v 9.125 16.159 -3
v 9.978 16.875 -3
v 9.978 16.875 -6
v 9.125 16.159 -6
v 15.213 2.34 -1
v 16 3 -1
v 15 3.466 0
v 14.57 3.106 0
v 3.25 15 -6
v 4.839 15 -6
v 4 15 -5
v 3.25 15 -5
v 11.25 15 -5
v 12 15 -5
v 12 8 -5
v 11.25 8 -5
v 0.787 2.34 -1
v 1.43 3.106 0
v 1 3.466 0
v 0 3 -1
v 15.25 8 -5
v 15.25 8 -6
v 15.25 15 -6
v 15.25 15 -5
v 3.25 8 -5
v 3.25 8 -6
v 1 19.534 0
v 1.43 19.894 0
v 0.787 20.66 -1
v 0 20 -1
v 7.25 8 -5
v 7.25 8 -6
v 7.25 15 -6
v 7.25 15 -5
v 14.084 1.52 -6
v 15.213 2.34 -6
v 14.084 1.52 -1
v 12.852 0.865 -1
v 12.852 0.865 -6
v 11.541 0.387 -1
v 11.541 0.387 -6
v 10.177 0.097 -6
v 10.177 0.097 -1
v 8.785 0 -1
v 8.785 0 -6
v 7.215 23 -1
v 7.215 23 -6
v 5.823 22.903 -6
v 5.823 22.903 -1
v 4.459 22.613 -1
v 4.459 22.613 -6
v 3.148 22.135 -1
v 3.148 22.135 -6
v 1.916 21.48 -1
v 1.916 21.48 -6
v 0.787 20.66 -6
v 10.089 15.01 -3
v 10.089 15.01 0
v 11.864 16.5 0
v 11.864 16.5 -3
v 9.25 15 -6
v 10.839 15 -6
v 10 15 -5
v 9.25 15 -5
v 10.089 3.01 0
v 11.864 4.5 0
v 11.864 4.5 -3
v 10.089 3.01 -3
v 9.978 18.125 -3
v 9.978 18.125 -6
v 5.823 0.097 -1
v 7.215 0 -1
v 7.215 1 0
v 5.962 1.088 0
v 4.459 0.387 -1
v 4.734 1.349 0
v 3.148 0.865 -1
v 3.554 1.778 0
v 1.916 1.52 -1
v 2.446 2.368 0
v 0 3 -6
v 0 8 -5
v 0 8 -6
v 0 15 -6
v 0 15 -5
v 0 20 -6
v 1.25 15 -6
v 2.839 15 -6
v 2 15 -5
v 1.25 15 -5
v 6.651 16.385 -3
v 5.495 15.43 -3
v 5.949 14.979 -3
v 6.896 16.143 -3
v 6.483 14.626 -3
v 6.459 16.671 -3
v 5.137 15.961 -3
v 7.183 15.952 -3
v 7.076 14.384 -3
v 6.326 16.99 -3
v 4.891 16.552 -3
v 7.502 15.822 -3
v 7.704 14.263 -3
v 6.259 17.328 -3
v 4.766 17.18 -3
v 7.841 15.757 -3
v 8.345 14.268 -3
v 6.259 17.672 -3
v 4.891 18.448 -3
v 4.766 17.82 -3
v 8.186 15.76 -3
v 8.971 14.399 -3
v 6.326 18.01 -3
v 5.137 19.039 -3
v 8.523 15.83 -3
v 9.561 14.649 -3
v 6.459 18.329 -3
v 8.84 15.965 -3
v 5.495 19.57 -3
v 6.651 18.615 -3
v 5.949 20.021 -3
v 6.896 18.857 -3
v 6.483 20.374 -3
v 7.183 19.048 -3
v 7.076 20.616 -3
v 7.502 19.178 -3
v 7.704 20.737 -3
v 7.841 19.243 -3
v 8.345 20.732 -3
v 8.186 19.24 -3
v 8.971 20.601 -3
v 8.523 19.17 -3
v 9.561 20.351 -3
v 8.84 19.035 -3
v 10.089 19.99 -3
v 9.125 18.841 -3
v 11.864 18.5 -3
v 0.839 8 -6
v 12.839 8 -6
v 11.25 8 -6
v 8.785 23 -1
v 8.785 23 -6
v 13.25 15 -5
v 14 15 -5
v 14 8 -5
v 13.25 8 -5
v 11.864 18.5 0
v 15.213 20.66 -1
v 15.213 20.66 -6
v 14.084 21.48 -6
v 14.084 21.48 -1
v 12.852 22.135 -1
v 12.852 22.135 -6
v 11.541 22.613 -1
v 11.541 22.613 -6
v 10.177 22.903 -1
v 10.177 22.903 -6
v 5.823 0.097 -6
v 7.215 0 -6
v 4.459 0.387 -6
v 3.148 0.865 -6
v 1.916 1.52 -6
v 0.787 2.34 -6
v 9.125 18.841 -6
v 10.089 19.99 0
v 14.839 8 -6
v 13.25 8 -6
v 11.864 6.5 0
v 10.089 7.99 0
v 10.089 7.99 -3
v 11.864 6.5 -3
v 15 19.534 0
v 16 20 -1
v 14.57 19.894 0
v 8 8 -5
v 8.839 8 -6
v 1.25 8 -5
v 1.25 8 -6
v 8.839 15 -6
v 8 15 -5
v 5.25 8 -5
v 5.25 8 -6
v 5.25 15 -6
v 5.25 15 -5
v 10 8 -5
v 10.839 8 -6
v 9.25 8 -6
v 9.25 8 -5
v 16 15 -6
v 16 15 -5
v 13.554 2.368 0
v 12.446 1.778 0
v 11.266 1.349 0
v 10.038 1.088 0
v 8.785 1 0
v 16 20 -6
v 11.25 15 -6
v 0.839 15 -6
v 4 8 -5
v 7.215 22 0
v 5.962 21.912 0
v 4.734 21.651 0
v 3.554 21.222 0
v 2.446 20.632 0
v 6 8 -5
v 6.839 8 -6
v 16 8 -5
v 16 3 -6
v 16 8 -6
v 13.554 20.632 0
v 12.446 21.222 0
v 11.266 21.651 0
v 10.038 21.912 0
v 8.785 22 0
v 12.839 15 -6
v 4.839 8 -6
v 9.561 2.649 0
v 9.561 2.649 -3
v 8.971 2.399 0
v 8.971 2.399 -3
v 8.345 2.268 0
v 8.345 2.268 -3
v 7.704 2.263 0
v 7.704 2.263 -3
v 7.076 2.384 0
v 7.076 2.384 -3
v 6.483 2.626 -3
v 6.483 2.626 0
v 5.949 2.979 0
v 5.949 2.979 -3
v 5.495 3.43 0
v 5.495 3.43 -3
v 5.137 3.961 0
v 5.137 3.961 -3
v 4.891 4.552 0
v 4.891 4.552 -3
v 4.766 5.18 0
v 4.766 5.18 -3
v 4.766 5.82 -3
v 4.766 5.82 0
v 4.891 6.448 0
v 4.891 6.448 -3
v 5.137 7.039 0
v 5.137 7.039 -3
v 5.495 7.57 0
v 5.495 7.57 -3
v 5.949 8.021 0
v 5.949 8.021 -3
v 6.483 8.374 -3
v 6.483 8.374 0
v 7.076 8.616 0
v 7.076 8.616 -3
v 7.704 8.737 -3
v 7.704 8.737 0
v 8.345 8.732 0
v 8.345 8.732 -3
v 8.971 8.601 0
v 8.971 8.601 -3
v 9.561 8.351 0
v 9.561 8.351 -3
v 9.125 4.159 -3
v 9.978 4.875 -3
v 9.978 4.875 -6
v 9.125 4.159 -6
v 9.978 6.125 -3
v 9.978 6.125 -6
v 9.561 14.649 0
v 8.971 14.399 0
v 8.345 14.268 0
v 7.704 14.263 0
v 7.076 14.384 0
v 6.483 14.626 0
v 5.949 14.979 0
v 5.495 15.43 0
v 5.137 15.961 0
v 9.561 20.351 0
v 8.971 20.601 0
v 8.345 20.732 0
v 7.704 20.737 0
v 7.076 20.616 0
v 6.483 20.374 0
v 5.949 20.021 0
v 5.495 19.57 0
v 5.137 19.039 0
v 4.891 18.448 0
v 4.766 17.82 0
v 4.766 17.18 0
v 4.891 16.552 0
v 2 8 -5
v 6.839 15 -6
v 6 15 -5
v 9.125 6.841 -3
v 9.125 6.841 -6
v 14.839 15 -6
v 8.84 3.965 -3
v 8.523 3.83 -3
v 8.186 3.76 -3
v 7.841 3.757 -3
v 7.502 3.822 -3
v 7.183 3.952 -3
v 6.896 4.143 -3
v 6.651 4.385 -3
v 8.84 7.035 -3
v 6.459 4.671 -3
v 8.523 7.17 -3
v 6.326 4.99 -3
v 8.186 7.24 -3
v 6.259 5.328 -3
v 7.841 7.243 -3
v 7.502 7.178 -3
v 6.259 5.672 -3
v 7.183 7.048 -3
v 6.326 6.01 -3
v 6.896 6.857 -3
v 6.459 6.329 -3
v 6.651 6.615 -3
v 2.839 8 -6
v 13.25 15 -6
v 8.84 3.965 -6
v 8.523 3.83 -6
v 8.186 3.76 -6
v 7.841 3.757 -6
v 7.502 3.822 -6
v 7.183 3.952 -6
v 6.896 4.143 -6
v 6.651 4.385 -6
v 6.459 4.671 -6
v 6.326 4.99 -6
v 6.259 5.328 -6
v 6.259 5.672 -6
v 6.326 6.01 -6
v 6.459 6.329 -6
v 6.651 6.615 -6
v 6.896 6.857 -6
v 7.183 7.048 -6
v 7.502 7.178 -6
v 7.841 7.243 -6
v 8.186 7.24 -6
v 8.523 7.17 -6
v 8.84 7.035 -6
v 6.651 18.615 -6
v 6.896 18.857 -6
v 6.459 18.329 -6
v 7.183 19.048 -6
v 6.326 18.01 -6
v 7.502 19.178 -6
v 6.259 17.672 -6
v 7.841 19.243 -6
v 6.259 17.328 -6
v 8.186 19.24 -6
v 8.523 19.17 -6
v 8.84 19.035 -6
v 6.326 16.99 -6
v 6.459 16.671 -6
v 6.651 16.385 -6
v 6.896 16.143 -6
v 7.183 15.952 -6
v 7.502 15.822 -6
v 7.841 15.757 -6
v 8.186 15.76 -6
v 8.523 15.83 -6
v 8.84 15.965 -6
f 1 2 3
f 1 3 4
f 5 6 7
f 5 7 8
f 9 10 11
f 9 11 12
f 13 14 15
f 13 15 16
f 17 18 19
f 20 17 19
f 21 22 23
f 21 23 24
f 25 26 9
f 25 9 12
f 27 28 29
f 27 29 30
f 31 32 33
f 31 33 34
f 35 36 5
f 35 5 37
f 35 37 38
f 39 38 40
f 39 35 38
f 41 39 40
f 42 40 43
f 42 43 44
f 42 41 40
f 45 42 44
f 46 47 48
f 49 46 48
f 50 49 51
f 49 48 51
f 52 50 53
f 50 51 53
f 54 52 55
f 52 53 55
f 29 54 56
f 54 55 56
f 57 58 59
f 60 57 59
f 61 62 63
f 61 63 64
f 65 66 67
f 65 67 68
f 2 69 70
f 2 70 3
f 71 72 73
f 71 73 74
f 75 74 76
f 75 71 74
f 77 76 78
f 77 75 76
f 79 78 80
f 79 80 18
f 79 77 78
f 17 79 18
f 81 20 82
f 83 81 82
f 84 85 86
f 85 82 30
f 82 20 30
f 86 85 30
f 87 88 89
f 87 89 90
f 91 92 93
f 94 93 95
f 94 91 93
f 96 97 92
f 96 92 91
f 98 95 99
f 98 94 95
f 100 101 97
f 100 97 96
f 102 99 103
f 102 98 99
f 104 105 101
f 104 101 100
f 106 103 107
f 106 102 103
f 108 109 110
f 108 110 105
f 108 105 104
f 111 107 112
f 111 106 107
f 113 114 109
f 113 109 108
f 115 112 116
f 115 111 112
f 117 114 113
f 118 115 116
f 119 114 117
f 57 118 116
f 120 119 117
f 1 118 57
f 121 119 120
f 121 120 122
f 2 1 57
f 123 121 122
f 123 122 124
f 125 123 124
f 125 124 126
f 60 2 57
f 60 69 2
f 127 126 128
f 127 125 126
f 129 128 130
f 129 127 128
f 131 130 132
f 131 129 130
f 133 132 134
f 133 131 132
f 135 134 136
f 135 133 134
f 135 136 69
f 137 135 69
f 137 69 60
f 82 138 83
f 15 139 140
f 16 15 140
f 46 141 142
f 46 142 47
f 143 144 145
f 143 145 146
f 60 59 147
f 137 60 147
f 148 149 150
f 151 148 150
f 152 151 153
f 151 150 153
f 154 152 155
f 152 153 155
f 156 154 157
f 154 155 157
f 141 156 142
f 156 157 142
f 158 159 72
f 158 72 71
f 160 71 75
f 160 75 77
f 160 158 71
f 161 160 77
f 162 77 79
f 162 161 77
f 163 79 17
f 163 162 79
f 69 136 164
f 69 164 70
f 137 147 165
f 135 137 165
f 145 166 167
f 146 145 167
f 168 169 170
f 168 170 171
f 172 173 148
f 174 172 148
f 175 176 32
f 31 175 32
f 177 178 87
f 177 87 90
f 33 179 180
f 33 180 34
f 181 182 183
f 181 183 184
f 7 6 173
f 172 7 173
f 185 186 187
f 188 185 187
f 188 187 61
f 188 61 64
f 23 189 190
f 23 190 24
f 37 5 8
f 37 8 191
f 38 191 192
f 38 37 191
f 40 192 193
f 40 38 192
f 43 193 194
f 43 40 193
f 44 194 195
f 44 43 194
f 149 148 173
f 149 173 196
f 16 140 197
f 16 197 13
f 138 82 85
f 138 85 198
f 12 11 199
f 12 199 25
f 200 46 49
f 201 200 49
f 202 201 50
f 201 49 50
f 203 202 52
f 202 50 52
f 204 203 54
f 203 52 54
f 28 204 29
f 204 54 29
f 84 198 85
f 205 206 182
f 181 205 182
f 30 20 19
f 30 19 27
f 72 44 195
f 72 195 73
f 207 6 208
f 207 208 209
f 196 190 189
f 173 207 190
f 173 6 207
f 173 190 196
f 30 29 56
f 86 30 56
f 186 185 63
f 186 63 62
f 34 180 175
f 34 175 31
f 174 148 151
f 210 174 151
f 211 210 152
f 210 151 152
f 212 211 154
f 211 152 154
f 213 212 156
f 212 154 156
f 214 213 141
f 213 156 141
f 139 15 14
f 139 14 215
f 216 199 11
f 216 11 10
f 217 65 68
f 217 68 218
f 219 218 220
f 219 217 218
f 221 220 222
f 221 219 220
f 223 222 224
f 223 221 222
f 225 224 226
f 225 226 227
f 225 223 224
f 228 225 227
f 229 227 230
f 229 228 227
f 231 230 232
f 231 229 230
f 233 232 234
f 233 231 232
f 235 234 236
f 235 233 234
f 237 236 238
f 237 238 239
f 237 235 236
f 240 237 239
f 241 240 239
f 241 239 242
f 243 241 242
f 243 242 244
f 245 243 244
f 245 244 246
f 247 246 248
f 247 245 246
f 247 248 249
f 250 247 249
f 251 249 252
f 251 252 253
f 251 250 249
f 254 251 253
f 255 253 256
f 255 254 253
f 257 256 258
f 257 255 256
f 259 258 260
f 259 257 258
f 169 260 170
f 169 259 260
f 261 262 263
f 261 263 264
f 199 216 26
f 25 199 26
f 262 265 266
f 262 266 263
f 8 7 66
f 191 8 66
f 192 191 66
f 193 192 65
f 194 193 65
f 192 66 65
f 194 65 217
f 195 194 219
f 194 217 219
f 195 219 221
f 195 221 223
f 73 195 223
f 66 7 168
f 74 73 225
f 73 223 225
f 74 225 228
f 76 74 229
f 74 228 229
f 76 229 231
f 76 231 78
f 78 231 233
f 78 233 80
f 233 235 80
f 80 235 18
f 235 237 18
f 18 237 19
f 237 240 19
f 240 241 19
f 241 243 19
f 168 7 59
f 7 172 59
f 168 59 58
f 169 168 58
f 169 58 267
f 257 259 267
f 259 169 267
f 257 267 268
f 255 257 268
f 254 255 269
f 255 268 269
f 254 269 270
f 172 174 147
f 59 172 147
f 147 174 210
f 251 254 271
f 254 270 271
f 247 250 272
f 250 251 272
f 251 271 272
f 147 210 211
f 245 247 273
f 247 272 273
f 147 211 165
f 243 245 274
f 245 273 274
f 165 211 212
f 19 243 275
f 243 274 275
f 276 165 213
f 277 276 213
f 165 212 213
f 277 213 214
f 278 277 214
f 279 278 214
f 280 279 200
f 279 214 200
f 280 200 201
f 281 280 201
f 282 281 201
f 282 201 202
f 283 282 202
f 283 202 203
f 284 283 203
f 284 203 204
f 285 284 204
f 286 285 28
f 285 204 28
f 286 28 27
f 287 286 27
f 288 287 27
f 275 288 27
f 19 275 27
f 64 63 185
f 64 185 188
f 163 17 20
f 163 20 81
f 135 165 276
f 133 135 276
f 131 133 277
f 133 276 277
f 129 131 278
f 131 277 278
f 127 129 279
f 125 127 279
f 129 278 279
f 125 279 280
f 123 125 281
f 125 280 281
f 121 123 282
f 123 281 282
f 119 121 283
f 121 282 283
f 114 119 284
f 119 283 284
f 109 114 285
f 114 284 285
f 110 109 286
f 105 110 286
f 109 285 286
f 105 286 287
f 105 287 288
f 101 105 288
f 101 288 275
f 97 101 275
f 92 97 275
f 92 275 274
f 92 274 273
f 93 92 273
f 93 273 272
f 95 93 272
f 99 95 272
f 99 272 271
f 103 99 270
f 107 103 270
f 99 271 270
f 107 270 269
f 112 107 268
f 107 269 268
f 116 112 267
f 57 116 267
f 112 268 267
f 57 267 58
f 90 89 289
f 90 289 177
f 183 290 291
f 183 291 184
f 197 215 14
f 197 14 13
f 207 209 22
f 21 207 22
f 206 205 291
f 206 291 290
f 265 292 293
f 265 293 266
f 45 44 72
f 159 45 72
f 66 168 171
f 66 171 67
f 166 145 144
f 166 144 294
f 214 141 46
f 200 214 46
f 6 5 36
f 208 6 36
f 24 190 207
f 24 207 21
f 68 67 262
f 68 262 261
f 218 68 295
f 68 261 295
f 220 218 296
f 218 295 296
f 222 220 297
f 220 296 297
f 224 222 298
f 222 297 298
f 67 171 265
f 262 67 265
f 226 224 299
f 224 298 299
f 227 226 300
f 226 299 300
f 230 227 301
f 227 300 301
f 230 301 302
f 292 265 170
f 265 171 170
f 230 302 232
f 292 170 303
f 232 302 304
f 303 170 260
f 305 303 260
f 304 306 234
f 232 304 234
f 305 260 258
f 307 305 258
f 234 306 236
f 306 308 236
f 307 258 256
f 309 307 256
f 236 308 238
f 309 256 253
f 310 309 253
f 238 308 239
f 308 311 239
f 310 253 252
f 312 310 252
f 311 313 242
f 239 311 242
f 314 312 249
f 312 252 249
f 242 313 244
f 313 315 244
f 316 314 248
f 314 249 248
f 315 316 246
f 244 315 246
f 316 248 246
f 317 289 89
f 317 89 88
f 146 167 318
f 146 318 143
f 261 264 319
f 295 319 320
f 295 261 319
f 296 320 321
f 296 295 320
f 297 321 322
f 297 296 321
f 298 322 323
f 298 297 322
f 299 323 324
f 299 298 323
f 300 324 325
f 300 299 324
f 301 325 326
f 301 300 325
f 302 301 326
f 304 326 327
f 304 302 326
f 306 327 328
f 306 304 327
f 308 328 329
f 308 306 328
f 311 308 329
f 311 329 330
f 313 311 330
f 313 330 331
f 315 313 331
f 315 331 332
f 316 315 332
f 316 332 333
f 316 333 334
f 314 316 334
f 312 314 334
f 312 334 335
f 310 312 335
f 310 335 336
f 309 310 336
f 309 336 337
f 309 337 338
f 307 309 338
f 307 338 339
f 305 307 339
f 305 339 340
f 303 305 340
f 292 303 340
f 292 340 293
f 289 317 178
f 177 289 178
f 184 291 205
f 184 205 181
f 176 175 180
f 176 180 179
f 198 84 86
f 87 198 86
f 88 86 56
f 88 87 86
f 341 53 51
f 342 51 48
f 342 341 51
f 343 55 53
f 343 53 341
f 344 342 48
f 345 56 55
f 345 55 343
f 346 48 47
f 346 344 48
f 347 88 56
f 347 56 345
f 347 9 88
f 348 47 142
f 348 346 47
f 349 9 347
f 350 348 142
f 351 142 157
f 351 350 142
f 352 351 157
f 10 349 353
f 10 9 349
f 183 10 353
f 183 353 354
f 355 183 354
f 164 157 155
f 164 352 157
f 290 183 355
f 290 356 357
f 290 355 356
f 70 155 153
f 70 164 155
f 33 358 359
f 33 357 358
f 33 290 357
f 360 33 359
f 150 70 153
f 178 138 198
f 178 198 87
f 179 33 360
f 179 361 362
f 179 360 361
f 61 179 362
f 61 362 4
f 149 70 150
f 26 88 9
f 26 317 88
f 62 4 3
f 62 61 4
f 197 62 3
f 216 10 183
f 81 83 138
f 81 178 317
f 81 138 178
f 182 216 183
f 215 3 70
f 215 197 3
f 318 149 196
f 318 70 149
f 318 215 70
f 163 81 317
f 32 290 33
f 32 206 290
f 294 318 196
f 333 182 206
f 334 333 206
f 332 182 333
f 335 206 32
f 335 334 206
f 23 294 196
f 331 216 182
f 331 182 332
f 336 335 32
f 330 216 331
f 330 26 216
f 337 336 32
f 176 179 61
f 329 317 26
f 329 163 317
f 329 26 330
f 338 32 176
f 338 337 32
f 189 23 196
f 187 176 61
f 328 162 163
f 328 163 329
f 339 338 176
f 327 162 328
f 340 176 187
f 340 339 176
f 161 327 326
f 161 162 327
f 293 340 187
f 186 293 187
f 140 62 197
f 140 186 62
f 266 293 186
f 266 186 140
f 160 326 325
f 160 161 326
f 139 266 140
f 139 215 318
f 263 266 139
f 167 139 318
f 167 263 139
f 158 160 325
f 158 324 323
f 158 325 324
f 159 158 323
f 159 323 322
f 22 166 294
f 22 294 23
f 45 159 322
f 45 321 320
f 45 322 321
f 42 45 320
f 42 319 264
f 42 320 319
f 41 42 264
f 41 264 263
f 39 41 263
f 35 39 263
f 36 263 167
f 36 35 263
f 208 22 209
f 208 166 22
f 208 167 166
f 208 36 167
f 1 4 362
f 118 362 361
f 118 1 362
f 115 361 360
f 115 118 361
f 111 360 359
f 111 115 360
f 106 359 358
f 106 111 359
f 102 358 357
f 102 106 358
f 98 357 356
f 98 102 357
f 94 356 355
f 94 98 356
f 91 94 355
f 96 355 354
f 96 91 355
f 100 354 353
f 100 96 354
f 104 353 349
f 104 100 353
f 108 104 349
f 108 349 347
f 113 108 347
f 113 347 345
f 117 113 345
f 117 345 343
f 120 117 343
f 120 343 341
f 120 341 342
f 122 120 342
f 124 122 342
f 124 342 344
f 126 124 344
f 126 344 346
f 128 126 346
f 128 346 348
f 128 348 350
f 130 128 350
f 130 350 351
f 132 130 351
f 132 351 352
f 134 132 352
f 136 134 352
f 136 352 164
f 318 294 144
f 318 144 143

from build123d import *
from OCP.BRepFilletAPI import BRepFilletAPI_MakeChamfer

# Parameters (mm, degrees)
CROQUIS2_W              = 16
CROQUIS2_H              = 23
SALIENTE_EXTRUIR1_DEPTH = 6
CORTAR_EXTRUIR1_DEPTH   = 3
CHAFL_N2_SIZE           = 3
CHAFL_N2_SIZE2          = 3.575260778
REDONDEO1_R             = 10
CHAFL_N1_SIZE           = 1
CROQUIS4_W              = 16
CROQUIS4_H              = 7
CORTAR_EXTRUIR2_DEPTH   = 1
SALIENTE_EXTRUIR2_DEPTH = 7
MATRIZL1_COUNT          = 8
MATRIZL1_PITCH          = 2


with BuildPart() as part:
    # Croquis2 → Saliente-Extruir1 (new body)
    with BuildSketch(Plane(origin=(0, 0, 0), x_dir=(-1, 0, 0), z_dir=(0, 0, -1))):
        with Locations((-8, 11.5)):
            Rectangle(CROQUIS2_W, CROQUIS2_H)
        with BuildLine():
            Line((-9.977670702, 6.125), (-9.977670702, 4.875))
            Line((-9.977670702, 4.875), (-9.124878317, 4.159422225))
            ThreePointArc((-9.124878317, 4.159422225), (-6.25, 5.5), (-9.124878317, 6.840577775))
            Line((-9.124878317, 6.840577775), (-9.977670702, 6.125))
        make_face(mode=Mode.SUBTRACT)
        with BuildLine():
            Line((-9.977670702, 18.125), (-9.977670702, 16.875))
            Line((-9.977670702, 16.875), (-9.124878317, 16.159422225))
            ThreePointArc((-9.124878317, 16.159422225), (-6.25, 17.5), (-9.124878317, 18.840577775))
            Line((-9.124878317, 18.840577775), (-9.977670702, 18.125))
        make_face(mode=Mode.SUBTRACT)
    extrude(amount=SALIENTE_EXTRUIR1_DEPTH)

    # Croquis3 → Cortar-Extruir1 (cut)
    with BuildSketch(Plane(origin=(-8, 0, 0), x_dir=(-1, 0, 0), z_dir=(0, 0, -1))):
        with BuildLine():
            Line((-19.864348845, 6.5), (-19.864348845, 4.5))
            Line((-19.864348845, 4.5), (-18.089059731, 3.01035556))
            ThreePointArc((-18.089059731, 3.01035556), (-12.75, 5.5), (-18.089059731, 7.98964444))
            Line((-18.089059731, 7.98964444), (-19.864348845, 6.5))
        make_face()
        with BuildLine():
            Line((-19.864348845, 18.5), (-18.089059731, 19.98964444))
            ThreePointArc((-18.089059731, 19.98964444), (-12.75, 17.5), (-18.089059731, 15.01035556))
            Line((-18.089059731, 15.01035556), (-19.864348845, 16.5))
            Line((-19.864348845, 16.5), (-19.864348845, 18.5))
        make_face()
    extrude(amount=CORTAR_EXTRUIR1_DEPTH, mode=Mode.SUBTRACT)

    # Chaflán2: one chamfer whose edges measure the first distance from different faces: ONE call of the kernel's chamfer builder (chamfer() names one face for all edges)
    chafl_n2_edges_1 = [part.edges().sort_by_distance(p)[0] for p in [
        (16, 23, -3),
        (16, 0, -3),
    ]]
    chafl_n2_side_1 = [part.faces().sort_by_distance(p)[0] for p in [
        (16, 11.5, -3),
    ]]
    chafl_n2_edges_2 = [part.edges().sort_by_distance(p)[0] for p in [
        (0, 23, -3),
        (0, 0, -3),
    ]]
    chafl_n2_side_2 = [part.faces().sort_by_distance(p)[0] for p in [
        (0, 11.5, -3),
    ]]
    chafl_n2 = BRepFilletAPI_MakeChamfer(part.part.solid().wrapped)
    for e in chafl_n2_edges_1:
        chafl_n2.Add(CHAFL_N2_SIZE, CHAFL_N2_SIZE2, e.wrapped, chafl_n2_side_1[0].wrapped)  # the first distance lies on this face
    for e in chafl_n2_edges_2:
        chafl_n2.Add(CHAFL_N2_SIZE, CHAFL_N2_SIZE2, e.wrapped, chafl_n2_side_2[0].wrapped)  # the first distance lies on this face
    add(Compound.cast(chafl_n2.Shape()), mode=Mode.REPLACE)

    # Redondeo1
    redondeo1_edges = [part.edges().sort_by_distance(p)[0] for p in [
        (3.575260778, 23, -3),
        (12.424739222, 23, -3),
        (3.575260778, 0, -3),
        (12.424739222, 0, -3),
    ]]
    fillet(redondeo1_edges, radius=REDONDEO1_R)

    # Chaflán1
    chafl_n1_edges = [part.edges().sort_by_distance(p)[0] for p in [
        (8, 0, 0),
        (8, 23, 0),
        (0.393543512, 20.330222216, 0),
        (15.606456488, 2.669777784, 0),
        (3.794761687, 22.396926208, 0),
        (12.205238313, 22.396926208, 0),
        (12.205238313, 0.603073792, 0),
        (3.794761687, 0.603073792, 0),
        (16, 11.5, 0),
        (0, 11.5, 0),
        (0.393543512, 2.669777784, 0),
        (15.606456488, 20.330222216, 0),
    ]]
    chamfer(chafl_n1_edges, length=CHAFL_N1_SIZE)

    # Croquis4 → Cortar-Extruir2 (cut)
    with BuildSketch(Plane(origin=(0, 0, -6), x_dir=(-1, 0, 0), z_dir=(0, 0, -1))):
        with Locations((-8, 11.5)):
            Rectangle(CROQUIS4_W, CROQUIS4_H)
    extrude(amount=-CORTAR_EXTRUIR2_DEPTH, mode=Mode.SUBTRACT)

    # Croquis5 → Saliente-Extruir2 (add)
    with BuildSketch(Plane(origin=(0, 8, 0), x_dir=(1, 0, 0), z_dir=(0, 1, 0))):
        Polygon((0, 5), (0.839099631, 6), (1.25, 6), (1.25, 5), align=None)
    saliente_extruir2 = extrude(amount=SALIENTE_EXTRUIR2_DEPTH)

    # MatrizL1: Saliente-Extruir2 ×8
    with Locations(*[(i * MATRIZL1_PITCH, 0, 0) for i in range(1, MATRIZL1_COUNT)]):
        add(saliente_extruir2)


solid = part.part
